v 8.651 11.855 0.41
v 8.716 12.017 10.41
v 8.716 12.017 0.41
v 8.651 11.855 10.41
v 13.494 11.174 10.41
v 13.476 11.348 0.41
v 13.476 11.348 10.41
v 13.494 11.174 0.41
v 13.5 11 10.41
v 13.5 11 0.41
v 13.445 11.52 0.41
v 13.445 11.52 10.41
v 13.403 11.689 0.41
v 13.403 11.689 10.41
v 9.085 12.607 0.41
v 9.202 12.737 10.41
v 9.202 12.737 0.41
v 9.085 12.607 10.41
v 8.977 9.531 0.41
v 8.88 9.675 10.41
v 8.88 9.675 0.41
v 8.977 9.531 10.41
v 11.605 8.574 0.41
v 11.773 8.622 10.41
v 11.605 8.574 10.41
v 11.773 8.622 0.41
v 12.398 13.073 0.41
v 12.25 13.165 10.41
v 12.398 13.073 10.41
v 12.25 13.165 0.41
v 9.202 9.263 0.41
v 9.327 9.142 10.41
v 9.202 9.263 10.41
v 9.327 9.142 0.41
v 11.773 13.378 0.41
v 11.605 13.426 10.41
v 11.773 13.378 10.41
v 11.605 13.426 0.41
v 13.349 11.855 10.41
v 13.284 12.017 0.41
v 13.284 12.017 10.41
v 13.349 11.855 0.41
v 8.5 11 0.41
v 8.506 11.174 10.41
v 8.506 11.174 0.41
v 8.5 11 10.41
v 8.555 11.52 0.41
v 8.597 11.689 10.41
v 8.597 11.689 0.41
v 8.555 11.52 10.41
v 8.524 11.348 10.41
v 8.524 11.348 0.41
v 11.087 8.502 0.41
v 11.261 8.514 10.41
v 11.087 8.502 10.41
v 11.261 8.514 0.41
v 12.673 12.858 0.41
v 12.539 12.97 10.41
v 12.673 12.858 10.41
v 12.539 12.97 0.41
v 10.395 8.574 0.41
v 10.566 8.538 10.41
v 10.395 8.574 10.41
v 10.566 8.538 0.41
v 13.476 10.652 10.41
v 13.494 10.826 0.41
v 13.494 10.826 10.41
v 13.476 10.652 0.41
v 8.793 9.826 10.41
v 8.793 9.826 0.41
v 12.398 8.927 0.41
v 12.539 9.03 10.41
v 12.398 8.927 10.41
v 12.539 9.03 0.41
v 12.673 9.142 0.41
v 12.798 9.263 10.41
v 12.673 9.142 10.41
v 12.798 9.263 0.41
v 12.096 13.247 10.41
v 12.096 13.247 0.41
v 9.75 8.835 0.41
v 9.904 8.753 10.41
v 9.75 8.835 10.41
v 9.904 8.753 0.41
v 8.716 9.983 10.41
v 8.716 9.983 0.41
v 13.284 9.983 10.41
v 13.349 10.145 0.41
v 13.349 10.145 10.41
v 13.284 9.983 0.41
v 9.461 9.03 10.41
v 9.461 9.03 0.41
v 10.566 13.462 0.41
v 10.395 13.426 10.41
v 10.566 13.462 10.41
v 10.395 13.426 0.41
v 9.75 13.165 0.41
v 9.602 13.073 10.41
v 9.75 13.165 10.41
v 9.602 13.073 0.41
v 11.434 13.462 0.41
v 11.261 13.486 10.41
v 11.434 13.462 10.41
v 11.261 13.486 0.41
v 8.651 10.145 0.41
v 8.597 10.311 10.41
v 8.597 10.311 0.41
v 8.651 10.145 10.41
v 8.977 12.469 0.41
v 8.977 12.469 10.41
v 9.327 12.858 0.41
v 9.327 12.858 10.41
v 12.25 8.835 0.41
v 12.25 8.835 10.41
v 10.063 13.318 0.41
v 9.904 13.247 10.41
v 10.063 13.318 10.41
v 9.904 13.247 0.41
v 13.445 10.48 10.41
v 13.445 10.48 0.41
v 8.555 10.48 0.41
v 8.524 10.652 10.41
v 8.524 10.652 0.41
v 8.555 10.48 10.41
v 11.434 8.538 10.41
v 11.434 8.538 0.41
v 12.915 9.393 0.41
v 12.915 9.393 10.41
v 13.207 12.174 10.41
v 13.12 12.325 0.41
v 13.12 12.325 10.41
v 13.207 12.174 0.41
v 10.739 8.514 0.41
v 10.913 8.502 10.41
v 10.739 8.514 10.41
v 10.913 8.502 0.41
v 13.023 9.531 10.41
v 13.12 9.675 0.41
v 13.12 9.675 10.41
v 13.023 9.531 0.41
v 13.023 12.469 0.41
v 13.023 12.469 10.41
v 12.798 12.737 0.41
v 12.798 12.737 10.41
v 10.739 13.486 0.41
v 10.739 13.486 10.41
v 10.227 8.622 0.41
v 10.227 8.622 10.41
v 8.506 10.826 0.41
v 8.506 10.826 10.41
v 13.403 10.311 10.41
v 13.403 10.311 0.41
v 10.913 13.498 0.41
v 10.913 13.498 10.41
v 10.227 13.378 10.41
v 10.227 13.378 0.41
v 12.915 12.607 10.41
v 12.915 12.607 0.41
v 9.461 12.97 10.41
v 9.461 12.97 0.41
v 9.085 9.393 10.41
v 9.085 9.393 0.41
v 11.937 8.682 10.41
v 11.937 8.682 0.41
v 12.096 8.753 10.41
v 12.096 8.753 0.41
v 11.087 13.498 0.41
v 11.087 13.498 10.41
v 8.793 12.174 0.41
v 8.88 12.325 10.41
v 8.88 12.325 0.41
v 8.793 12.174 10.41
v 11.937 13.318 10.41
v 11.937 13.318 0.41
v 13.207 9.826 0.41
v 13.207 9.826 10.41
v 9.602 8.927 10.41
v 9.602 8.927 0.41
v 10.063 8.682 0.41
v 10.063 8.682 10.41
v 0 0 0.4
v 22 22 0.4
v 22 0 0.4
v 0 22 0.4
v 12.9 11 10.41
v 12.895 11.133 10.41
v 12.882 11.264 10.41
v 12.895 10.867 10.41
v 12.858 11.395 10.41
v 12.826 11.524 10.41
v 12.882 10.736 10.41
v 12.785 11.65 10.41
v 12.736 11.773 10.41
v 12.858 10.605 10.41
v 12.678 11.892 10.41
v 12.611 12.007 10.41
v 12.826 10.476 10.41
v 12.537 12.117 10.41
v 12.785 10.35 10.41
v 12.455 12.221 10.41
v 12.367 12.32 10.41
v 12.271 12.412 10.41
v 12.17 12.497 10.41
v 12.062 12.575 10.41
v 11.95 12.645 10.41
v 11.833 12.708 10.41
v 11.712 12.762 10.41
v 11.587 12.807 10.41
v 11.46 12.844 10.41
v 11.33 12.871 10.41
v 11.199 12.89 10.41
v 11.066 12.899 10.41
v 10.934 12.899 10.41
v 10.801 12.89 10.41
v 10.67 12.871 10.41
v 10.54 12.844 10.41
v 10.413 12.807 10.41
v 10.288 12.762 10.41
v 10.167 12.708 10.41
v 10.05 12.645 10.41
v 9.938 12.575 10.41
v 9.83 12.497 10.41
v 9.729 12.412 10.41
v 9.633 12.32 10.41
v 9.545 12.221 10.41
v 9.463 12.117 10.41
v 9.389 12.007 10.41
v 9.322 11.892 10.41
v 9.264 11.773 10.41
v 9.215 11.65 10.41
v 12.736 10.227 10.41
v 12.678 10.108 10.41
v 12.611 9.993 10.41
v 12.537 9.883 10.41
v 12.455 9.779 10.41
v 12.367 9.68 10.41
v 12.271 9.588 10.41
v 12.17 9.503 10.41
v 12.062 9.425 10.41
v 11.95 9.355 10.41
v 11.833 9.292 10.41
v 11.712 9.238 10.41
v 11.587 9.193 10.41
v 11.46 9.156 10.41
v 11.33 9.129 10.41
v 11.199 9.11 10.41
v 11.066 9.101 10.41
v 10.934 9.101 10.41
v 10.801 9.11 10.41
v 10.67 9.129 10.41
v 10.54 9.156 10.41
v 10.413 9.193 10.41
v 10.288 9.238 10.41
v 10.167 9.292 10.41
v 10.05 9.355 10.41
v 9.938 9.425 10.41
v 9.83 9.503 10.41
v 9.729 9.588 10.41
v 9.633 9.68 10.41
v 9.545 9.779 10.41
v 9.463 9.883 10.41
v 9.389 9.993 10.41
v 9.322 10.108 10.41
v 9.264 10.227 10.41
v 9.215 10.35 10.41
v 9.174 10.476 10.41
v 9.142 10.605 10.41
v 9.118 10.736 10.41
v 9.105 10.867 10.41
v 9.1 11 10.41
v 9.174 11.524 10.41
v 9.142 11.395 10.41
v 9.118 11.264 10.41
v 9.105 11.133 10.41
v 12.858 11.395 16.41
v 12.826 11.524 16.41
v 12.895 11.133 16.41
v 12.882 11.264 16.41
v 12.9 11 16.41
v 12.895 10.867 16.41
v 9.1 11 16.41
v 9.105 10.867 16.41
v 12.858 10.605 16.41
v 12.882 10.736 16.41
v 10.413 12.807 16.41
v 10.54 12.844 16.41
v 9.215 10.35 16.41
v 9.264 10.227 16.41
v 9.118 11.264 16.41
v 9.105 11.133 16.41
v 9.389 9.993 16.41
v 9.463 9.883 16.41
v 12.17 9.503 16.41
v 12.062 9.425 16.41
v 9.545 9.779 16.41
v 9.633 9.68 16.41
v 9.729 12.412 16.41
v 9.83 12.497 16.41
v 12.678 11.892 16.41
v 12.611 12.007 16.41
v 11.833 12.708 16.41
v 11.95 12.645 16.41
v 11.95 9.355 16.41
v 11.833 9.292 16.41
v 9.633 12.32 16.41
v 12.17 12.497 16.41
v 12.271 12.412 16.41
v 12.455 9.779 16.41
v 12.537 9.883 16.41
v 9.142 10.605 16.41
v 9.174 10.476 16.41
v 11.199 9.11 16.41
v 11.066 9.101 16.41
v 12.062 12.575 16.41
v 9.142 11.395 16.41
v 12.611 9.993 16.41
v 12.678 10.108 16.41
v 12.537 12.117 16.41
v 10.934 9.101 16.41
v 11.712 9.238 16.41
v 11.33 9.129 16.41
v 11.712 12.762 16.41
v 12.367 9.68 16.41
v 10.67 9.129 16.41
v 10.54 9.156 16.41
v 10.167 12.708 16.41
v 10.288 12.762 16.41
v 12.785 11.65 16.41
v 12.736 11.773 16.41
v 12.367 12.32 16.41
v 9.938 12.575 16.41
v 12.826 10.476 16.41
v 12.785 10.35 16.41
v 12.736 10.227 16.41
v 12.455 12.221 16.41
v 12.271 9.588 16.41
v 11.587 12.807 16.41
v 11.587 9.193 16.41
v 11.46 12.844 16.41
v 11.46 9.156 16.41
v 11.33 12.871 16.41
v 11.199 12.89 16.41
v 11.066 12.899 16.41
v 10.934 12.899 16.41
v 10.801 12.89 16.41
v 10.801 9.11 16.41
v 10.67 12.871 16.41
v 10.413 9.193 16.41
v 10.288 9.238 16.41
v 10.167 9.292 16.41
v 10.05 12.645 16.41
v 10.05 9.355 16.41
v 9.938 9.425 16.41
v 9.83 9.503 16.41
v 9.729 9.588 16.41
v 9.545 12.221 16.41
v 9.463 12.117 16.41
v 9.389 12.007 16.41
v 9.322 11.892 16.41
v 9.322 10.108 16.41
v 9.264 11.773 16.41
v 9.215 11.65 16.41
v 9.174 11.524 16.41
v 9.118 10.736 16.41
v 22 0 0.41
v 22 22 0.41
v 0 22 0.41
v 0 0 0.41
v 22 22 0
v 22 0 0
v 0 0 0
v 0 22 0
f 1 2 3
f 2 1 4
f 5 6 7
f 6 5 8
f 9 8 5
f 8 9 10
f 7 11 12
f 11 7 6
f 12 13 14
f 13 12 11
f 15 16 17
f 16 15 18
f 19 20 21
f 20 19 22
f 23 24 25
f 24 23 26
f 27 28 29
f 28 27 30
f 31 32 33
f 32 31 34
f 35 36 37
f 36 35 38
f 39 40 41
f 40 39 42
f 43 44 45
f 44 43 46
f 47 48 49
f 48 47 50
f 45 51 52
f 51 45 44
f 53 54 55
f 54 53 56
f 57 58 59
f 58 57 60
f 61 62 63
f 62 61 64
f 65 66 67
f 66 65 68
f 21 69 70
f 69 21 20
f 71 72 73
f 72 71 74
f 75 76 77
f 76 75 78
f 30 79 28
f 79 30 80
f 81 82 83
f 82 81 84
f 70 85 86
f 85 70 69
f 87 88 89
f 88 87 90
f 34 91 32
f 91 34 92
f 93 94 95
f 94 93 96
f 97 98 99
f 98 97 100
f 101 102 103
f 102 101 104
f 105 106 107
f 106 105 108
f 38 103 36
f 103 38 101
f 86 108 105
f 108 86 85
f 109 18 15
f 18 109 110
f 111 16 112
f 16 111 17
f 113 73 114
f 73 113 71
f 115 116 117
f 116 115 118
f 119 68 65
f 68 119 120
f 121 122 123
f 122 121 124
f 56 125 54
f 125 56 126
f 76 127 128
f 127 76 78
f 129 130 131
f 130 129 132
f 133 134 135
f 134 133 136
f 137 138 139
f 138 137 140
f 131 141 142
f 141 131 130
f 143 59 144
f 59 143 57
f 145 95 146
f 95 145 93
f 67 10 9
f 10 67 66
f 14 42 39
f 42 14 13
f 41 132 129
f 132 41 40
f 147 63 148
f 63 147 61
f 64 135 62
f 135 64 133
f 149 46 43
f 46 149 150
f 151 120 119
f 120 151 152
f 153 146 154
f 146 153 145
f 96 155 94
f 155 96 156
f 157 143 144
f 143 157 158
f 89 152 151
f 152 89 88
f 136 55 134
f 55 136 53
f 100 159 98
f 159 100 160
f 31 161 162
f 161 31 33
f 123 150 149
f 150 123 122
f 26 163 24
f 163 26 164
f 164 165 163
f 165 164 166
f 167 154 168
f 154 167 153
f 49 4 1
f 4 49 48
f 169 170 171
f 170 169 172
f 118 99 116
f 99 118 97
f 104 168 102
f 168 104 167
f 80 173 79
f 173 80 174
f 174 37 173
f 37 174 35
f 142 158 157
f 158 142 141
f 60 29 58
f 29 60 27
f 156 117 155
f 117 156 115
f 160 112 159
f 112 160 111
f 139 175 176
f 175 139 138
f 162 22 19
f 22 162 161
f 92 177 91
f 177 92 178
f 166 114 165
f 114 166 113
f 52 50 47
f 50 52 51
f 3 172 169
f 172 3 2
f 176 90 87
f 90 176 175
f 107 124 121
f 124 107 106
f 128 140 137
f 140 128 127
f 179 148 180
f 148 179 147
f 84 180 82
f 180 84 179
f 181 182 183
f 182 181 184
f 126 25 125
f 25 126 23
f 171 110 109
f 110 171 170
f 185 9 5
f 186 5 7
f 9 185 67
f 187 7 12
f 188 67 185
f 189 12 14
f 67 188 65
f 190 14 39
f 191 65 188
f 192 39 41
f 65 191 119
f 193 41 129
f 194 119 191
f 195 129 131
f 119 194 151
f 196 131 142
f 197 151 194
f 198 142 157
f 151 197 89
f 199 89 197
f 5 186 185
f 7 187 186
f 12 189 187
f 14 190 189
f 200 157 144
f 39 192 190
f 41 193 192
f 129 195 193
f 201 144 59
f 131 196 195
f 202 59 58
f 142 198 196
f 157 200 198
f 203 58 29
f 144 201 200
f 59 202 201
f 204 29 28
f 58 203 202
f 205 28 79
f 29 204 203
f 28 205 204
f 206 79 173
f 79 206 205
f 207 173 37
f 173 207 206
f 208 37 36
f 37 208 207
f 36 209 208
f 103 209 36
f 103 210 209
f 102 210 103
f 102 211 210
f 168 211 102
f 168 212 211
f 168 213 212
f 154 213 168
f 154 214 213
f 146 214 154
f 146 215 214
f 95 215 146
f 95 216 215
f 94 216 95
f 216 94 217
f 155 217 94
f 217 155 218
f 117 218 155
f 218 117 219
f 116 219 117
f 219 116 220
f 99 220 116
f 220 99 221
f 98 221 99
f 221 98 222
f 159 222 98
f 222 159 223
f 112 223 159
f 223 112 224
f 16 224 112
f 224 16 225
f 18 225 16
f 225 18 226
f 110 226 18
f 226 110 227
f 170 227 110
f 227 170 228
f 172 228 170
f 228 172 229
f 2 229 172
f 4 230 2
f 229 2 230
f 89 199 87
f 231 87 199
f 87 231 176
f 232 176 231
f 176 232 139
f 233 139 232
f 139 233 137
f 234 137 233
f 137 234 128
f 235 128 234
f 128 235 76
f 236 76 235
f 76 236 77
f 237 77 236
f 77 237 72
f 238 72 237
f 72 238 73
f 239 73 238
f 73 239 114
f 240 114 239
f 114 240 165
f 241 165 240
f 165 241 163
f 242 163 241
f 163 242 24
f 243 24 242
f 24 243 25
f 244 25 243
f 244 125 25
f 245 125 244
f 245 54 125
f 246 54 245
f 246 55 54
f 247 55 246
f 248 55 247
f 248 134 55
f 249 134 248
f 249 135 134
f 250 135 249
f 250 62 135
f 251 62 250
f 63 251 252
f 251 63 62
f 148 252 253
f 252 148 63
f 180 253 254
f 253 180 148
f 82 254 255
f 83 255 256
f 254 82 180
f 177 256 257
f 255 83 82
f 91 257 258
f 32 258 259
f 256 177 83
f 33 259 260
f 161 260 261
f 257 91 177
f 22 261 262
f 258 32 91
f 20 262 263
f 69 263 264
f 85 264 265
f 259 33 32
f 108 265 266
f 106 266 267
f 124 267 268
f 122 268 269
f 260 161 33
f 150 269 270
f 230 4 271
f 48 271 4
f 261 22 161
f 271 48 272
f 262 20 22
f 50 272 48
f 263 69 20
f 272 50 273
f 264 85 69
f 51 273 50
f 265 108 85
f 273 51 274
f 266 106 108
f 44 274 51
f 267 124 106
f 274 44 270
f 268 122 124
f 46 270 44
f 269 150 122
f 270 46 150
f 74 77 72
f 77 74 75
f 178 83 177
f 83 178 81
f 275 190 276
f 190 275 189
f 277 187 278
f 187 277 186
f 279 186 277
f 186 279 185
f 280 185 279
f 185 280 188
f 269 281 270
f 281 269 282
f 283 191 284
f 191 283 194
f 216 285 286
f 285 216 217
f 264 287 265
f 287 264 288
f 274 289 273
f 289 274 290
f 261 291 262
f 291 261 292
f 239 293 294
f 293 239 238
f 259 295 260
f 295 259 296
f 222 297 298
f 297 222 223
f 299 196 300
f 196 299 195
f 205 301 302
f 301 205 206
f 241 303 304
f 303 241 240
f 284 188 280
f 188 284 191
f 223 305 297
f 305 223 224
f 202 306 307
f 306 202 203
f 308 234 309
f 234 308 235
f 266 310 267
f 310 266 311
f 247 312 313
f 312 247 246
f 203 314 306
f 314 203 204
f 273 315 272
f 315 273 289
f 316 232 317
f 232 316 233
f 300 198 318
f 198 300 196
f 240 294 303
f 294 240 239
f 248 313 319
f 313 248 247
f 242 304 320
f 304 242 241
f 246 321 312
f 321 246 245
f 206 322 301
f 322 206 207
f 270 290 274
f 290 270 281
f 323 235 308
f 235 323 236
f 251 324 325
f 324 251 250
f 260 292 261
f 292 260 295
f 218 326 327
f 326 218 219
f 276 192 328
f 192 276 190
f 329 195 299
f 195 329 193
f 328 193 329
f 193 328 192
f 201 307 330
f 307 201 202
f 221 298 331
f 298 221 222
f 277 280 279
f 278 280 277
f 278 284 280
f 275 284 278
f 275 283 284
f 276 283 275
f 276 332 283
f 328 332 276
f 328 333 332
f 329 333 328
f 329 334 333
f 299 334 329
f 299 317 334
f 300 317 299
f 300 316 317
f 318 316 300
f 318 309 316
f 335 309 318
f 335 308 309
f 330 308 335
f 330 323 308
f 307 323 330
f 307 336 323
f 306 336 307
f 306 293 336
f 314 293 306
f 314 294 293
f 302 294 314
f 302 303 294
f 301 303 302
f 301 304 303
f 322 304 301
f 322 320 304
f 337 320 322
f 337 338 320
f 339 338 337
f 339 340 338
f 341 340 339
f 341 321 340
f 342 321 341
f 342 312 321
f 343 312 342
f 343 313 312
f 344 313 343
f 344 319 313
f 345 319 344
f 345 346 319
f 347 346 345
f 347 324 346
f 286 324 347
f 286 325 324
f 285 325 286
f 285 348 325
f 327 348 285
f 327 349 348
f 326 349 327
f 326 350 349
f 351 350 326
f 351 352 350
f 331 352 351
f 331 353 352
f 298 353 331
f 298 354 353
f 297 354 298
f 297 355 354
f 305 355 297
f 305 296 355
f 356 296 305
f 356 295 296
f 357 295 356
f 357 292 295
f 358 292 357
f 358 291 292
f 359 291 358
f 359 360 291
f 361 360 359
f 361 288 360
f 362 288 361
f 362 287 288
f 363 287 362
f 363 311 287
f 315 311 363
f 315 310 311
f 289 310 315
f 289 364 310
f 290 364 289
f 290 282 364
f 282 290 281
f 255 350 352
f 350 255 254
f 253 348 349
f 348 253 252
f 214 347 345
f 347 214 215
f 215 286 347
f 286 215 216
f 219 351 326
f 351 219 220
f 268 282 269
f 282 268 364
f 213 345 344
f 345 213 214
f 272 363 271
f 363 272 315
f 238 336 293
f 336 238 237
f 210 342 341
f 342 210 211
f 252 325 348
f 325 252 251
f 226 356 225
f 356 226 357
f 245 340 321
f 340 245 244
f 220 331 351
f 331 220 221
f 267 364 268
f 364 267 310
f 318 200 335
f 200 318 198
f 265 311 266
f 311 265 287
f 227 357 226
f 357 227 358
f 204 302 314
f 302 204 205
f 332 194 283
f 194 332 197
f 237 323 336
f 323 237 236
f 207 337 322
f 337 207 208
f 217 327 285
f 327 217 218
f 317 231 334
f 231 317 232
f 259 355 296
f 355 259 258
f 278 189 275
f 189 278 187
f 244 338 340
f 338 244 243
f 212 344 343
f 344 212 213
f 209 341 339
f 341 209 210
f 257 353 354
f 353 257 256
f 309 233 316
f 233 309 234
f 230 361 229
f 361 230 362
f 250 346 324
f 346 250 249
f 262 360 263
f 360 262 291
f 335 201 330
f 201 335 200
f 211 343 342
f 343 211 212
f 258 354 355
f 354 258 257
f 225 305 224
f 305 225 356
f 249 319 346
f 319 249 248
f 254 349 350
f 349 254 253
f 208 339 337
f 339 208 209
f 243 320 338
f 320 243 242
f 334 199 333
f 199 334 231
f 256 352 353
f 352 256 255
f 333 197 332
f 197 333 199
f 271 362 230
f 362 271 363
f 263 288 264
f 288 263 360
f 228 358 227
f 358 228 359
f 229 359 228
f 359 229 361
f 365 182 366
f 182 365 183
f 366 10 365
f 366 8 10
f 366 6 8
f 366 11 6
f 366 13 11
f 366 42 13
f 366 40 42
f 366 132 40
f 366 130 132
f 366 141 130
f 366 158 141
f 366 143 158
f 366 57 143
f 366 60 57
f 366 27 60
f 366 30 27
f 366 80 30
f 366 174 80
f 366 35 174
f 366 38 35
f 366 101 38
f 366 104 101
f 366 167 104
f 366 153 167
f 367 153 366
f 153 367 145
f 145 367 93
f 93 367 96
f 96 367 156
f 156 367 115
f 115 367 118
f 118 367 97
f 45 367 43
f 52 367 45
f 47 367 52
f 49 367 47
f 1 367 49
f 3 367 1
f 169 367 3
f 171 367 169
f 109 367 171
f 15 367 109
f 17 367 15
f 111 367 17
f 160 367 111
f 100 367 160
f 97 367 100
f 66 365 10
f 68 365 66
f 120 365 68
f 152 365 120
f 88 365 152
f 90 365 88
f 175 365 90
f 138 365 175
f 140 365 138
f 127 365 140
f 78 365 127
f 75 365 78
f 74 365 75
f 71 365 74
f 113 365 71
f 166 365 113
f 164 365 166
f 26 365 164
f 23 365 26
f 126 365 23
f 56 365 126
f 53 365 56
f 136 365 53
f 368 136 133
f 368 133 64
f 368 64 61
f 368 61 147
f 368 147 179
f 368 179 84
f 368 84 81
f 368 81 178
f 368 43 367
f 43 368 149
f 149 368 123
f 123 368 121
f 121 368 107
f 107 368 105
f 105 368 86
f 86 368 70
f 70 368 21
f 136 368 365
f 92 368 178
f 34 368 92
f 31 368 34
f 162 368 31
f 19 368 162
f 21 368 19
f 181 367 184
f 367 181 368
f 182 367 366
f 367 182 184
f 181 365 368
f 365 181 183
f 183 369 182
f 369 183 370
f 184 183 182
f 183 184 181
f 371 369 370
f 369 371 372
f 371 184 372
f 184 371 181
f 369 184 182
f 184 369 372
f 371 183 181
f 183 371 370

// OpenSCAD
// file: ../../Base/Rotation.scad
// Fischertechnik Box Foundation
// Geometry Helpers Rotation

include <PlacementOptions.scad>

// getRotatedSpace(space, rotation=NoRotation)
// Rotates the space dependent on the specified rotation

function getRotatedSpace(space, rotation=NoRotation) = [
    (rotation == Rotate90 || rotation == Rotate270) ? space.y : space.x,
    (rotation == Rotate90 || rotation == Rotate270) ? space.x : space.y
];

// Rotates the given space around the fixed left lower corner
// space = the space the children needs as width/depth list [width,depth]
// rotation = 0 Rotate0 degrees, 1 Rotate90 degrees, 2 Rotate180 degrees, 3 Rotate270 degrees (equivalent to -90)

module RotateFix(space, rotation=NoRotation) {
    dy = (rotation == Rotate0 || rotation == Rotate270) ? 0 :
        (rotation == Rotate90) ? space.x :
        space.y;
    dx = (rotation < Rotate180) ? 0 :
        (rotation == Rotate180) ? space.x :
        space.y;
    
    translate([dx, dy, 0])
        rotate([0, 0, rotations[rotation]])
            children();
}
// file: ../../Base/Alignment.scad
// Fischertechnik Box Foundation
// Geometry Helpers Alignment

include <PlacementOptions.scad>

// getAlignedX(elementWidth, spaceWidth, align=AlignRight, offset=0)
// Gets the aligned X offset of an element with the given
// width in the given space.
// elementWidth = The width of the element to positon
// spaceWidth = The space where the element should be aligned
// align = 0 AlignLeft, 1 AlignCenter, 2 AlignRight
// offset = an optional offset from the aligned position. When
// aligned left or centered, then positive values are in X direction.
// When aligned right then positive values are in negative X direction.

function getAlignedX(elementWidth, spaceWidth, align=AlignRight, offset=0) =
    (align == AlignLeft) ?
        offset :
        ((align == AlignCenter) ?
        (spaceWidth - elementWidth)/2 + offset :
        spaceWidth - offset - elementWidth);

// getAlignedY(elementDepth, spaceDepth, align=AlignTop, offset=0)
// Gets the aligned Y offset of an element with the given
// depth in the given space.
// elementDepth = The depth of the element to positon
// spaceDepth = The space where the element should be aligned
// align = 0 AlignBottom, 1 AlignCenter, 2 AlignTop
// offset = an optional offset from the aligned position. When
// aligned bottom or centered, then positive values are in Y direction.
// When aligned top then positive values are in negative Y direction.

function getAlignedY(elementDepth, spaceDepth, align=AlignTop, offset=0) =
    (align == AlignBottom) ?
        offset :
        ((align == AlignCenter) ?
        (spaceDepth - elementDepth)/2 + offset :
        spaceDepth - offset - elementDepth);
// file: ../../Base/PlacementOptions.scad
// Fischertechnik Box Foundation
// Placement Options

// Alignment
NoAlign = 0;
AlignLeft = 1;
AlignBottom = 2;
AlignCenter = 3;
AlignRight = 4;
AlignTop = 5;

// Element rotation degree steps
rotations = [0, -90, -180, -270];

// Rotation
NoRotation = 0;
Rotate0 = 0;
Rotate90 = 1;
Rotate180 = 2;
Rotate270 = 3;

// Docking (seen from above)
NoDock = -1;
DockLeft = 0;
DockTop = 1;
DockRight = 2;
DockCorner = 2;
DockBottom = 3;

// Web corners
LowerLeft = 0;
UpperLeft = 1;
UpperRight = 2;
LowerRight = 3;

// Web position relative to corner
LeftOfCorner = 0;
RightOfCorner = 1;
// file: ../../Base/Boxes.scad
// Fischertechnik Box Foundation
// Pre-designed Boxes

use <Constants.scad>

include <PlacementOptions.scad>

box190Width = 190;
box190Depth = 130;
box130Width = 130;
box130Depth = 95;

// Values are from an original ec3 box
topBottomDifference = 1.5;
outerHeight = 40;
innerHeight = 38.2;
baseThickness = outerHeight - innerHeight;
stackExcess = 5.7;
radius = 3.5;
wallThickness = 1.5;
tolerance = 0.2;
stackOffset = innerHeight - stackExcess;

boxUsageHeight = stackOffset;
boxWallThickness = wallThickness;
boxBaseThickness = baseThickness;
boxWebWidth = 3.0;

// getBoxWallThickness()
// Gets the wall thickness of a Fischertechnik Box
function getBoxWallThickness() = boxWallThickness;

// getBoxUsageHeight()
// Gets the usable height of a Fischertechnik box
function getBoxUsageHeight() = boxUsageHeight;

// getBoxInnerHeight()
// Gets the inner height of a Fischertechnik box, including the stack excess
function getBoxInnerHeight() = innerHeight;

// getBoxBaseThickness()
// Gets the thickness of the Fischertechnik box base.
function getBoxBaseThickness() = boxBaseThickness;

// getBoxWebWidth()
// Gets the width of a box web
function getBoxWebWidth() = boxWebWidth;

// getBox190Space()
// Gets the usable inner space of a Box 190 as an x/y-list
function getBox190Space() = [
    box190Width - 2*getBoxWallThickness() - topBottomDifference, 
    box190Depth - 2*getBoxWallThickness() - topBottomDifference ];

// BoxBase(width, depth)
// Creates an empty stackable Fischertechnik compatible box
// width = Outer width of the box (190, 130, ...)
// depth = Outer depth of the box (130, 95, ...)

module BoxBase(width, depth, height=outerHeight) {    
    thinPlate = 0.01;

    innerHeight = height - baseThickness;    
    
    module BodyPlate(width, depth) {
        translate([radius, radius])
        hull() {
            w = width-2*radius;
            d = depth-2*radius;
            cube([w, d, thinPlate]);
            cylinder(thinPlate, r=radius, $fn=getFragments());
            translate([w, 0])
                cylinder(thinPlate, r=radius, $fn=getFragments());
            translate([w, d])
                cylinder(thinPlate, r=radius, $fn=getFragments());
            translate([0, d])
                cylinder(thinPlate, r=radius, $fn=getFragments());
        }
    }
    
    module Body(tolerance=tolerance) {
        hull() {
            // Bottom with tolerance to fit into the original boxes when stacked
            translate([-wallThickness+tolerance, -wallThickness+tolerance, -baseThickness])
                BodyPlate(width-topBottomDifference-2*tolerance, depth-topBottomDifference-2*tolerance);
            
            // Top
            translate([-wallThickness-topBottomDifference/2, -wallThickness-topBottomDifference/2, innerHeight-thinPlate])
                BodyPlate(width, depth);
         }
    }

    module Cutoff() {
        hull() {
            coWidth = width - 2*wallThickness;
            coDepth = depth - 2*wallThickness;
            
            // Bottom
            BodyPlate(coWidth-topBottomDifference, coDepth-topBottomDifference);

            // Top
            translate([-topBottomDifference/2, -topBottomDifference/2, innerHeight+thinPlate]) 
                BodyPlate(coWidth, coDepth);
        }
    }
    
    difference() {        
        Body();
        Cutoff();
        stackOffset = innerHeight - stackExcess;
        translate([0, 0, stackOffset + baseThickness])
            Body(tolerance=0);
    }
}

// Creates the Fischertechnik empty box 130x190 mm and places it at position 0,0
// 190x130 are the outer sizes, the inner space is slightly smaller. Use getBox190Space() to get the inner sizes.
// The box is positioned that the usable inner space is at the 0,0,0 position. The

module Box190() {
    BoxBase(box190Width, box190Depth);
}

// Gets the usable inner space of a Box 130 as an x/y-list
function getBox130Space() = [
    box130Width - 2*getBoxWallThickness() - topBottomDifference, 
    box130Depth - 2*getBoxWallThickness() - topBottomDifference ];

// Creates the Fischertechnik empty box 95x130 mm and places it at position 0,0
// 190x130 are the outer sizes, the inner space is slightly smaller. Use getBox190Space() to get the inner sizes.
// The box is positioned that the usable inner space is at the 0,0,0 position. The

module Box130() {
    BoxBase(box130Width, box130Depth);
}

// Creates a web at the specified box walls
// corner 0 = LowerLeft, 1 = UpperLeft, 2 = UpperRight, 3 = LowerRight
// side 0 = LeftOfCorner, 1 = RightOfCorner
// distance = Distance in mm from the corner
// boxSpace = inner width and depth of the box (default: Box 190)
// webWidth = length of the web (default is 3 mms)
// webThickness = thickness of the web (default is 1 mm)

module BoxWeb(corner, side, distance, boxSpace=getBox190Space(), webWidth=getBoxWebWidth(), webThickness=1.0) {
    sink = getBoxWallThickness()/2;

    width = (corner % 2 == 0) ? 
            (side == LeftOfCorner ? webWidth : webThickness) :
            (side == LeftOfCorner ? webThickness : webWidth);

    depth = (corner % 2 == 0) ? 
            (side == RightOfCorner ? webWidth : webThickness) :
            (side == RightOfCorner ? webThickness : webWidth);
    
    xDiff = corner == LowerLeft ? 
                (side == LeftOfCorner ? -sink : distance) :
            (corner == UpperLeft ?                
                (side == LeftOfCorner ? distance : -sink) :
            (corner == UpperRight ?
                (side == LeftOfCorner ? boxSpace.x-webWidth+sink : boxSpace.x-distance-webThickness) :
                (side == LeftOfCorner ? boxSpace.x-distance-webThickness: boxSpace.x-webWidth+sink)));

    yDiff = corner == LowerLeft ? 
                (side == RightOfCorner ? -sink : distance) :
            (corner == UpperLeft ?
                (side == RightOfCorner ? boxSpace.y-distance : boxSpace.y-webWidth+sink) :
            (corner == UpperRight ?
                (side == RightOfCorner ? boxSpace.y-webWidth+sink : boxSpace.y-distance) :
                (side == RightOfCorner ? distance : -sink)));
    
    translate([xDiff, yDiff, -getExcess()])
        cube([width, depth, boxUsageHeight + 2*getExcess()]);
}
// file: ../../Base/Placement.scad
// Fischertechnik Box Foundation
// Geometry Helpers Placement

use <Constants.scad>
use <Alignment.scad>
use <Rotation.scad>
use <Boxes.scad>

include <PlacementOptions.scad>

// Place(x=0, y=0, elementSpace=[0,0], alignX=AlignLeft, alignY=AlignBottom, rotation=Rotate0, boxSpace=getBox190Space())
// Places the child at the specified position
// y = Y-Position. This is a relative position when an X aligment is specified.
// x = X-Position. This is a relative position when an Y aligment is specified.
// elementSpace = space of the element to be placed [x,y]
// alignX = -1=NoAlign, 0 AlignLeft, 1 AlignCenter, 3 AlignRight (elementSpace and boxSpace required!)
// alignY = -1=NoAlign, 2 AlignBottom, 1 AlignCenter, 4 AlignTop (elementSpace and boxSpace required!)
// rotation = 0 Rotate0 0 degrees, 1 Rotate90 90 degrees, 
// 2 Rotate180 180 degrees, 3 Rotate270 270 degrees (equivalent to -90)
// boxSpace = Inner space of the box where the placement occurs [x,y] - default is Box 190x130 inner space

module Place(x=0, y=0, elementSpace=[0,0], 
  alignX=AlignLeft, alignY=AlignBottom, 
  rotation=NoRotation, boxSpace=getBox190Space()) {

    module Position(x, y, space, rotation=Rotate0) {
        translate([x, y, 0])
            RotateFix(space, rotation)
                children();
    }

    space = getRotatedSpace(elementSpace, rotation);
    alignedX = getAlignedX(space.x, boxSpace.x, alignX, x);
    alignedY = getAlignedY(space.y, boxSpace.y, alignY, y);
    Position(alignedX, alignedY, elementSpace, rotation)
        children();
}

// Center(space=getBox130Space(), elementSpace=[0,0])
// space = Space where the children is centered. For cylinder use centered=true and no elementSpace.
// elementSpace = space of the element to be centered [x,y]

module Center(space=getBox190Space(), elementSpace=[0,0]) {
    Place(elementSpace=elementSpace, boxSpace=space, alignX=AlignCenter, alignY=AlignCenter)
        children();
}

// CenterHorizontal(width=0, y=0, offset=0, space=getBox130Space())
// width = Width of the element to be placed.
// y = Y position of the element
// offset = Offset from the center position (negative will be left of the center)
// space = Space where the element is placed

module CenterHorizontal(width=0, y=0, offset=0, space=getBox190Space()) {
    Place(x=offset, y=y, elementSpace=[width, 0], boxSpace=space, alignX=AlignCenter)
        children(0);
}

// CenterVertical(depth=0, x=0, offset=0, space=getBox130Space())
// depth = Depth of the element to be placed.
// x = X position of the element
// offset = Offset from the center position (negative will be down of the center)
// space = Space where the element is placed

module CenterVertical(depth=0, x=0, offset=0, space=getBox190Space()) {
    Place(x=x, y=offset, elementSpace=[0, depth], boxSpace=space, alignY=AlignCenter)
        children(0);
}

// getIsVertical(align)
// True if the specified alignment needs a vertical orientation for a divider (AlignRight, AlignLeft)

function getIsVertical(align) = (align == AlignRight || align == AlignLeft);

// getIsHorizontal(align)
// True if the specified alignment needs a horizontal orientation for a divider (AlignTop, AlignBottom)

function getIsHorizontal(align) = (align == AlignTop || align == AlignBottom);
// file: ../../Elements/AxisClip10.scad
// Fischertechnik Box Library
// Axis for clip 10
// 31023

use <../ModelBase/Simple.scad>
use <../Base/Constants.scad>

/* [Element Parameters] */
height = 23;
clipHeight = 10;

/* [Hidden] */
width = 12;
depth = 12;
upperDiameter = 3.6;

// getAxisClip10Space()
// Gets the space of a frame for a clip 10 with spring ring (mot2)

function getAxisClip10Space() = [width, depth, height];

// AxisClip10(height, clipHeight)
// Axis for clip 10 with spring ring (mot2)
// height = Height of the complete axis (standard is 23, in mot3 its only 12)
// clipHeight = Height of the part for the clip (standard is 10, in mot3 its only 7)

module AxisClip10(height=height, clipHeight=clipHeight) {
    LeveledAxisWithSpace(height, height-clipHeight, getAxisClip10Space(), diameter=upperDiameter);
}

// Test
color("lightgray")
AxisClip10(height, clipHeight);
// file: ../../Base/Constants.scad
// Fischertechnik Box Foundation
// Constants

// Constant values necessary for multiple elements

// Base constants
dividerThickness = 1.2;
excess = 0.01;
fragments = 90;
tolerance = 0.8;

// Gets the thickness of a divider 
function getDividerThickness() = dividerThickness;

// Gets the excess that is used to merge walls into each other
function getExcess() = excess;

// Gets amount of fragments of a cylinder
function getFragments() = fragments;

// Gets the inner tolerance of a frame to each side
function getTolerance() = tolerance;


// Fischertechnik specific constants
axisDiameter = 4;
axisBottomDiameter = axisDiameter + 1;
axisTolerance = 0.2;
standardEdgeDistance = 2.5;
standardWebDistance = 11.5;
standardCornerLength = 15;
tubeWallFactor = 0.8;
smallPartsFrameHeight = 20;

// Gets axis diameter of Fischertechnik axis
function getAxisDiameter() = axisDiameter;

// Gets axis diameter tolerance (subtracted for element axis)
function getAxisTolerance() = axisTolerance;

// Gets the axis diameter for standing axis
function getStandAxisDiameter() = getAxisDiameter() - getAxisTolerance();

// Gets axis bottom diameter for thicker part at the bottom
function getAxisBottomDiameter() = axisBottomDiameter;

// gets the standard distance to the wall of the box for dockable frames with webs
function getStandardEdgeDistance() = standardEdgeDistance;

// gets the standard distance of each web to the corner of the dockable frame
function getStandardWebDistance() = standardWebDistance;

// gets the standard length of the corner walls of a dockable frame
function getStandardCornerLength() = standardCornerLength;

// gets the wall thickness of a tube.
function getTubeWallThickness() = tubeWallFactor * getDividerThickness();

// gets the frame height for docked small parts boxes.
function getSmallPartsFrameHeight() = smallPartsFrameHeight;
// file: ../../Elements/AxisPulley.scad
// Fischertechnik Box Library
// Axis for Wheel Pulley
// 35795

use <../Base/Constants.scad>
use <../ModelBase/Simple.scad>

width = 22;
depth = 22;

// getAxisPulleySpace()
// Gets the space the axis wheel pulley needs as width and depth (.x and .y as a list)

function getAxisPulleySpace() = [width, depth];

// AxisPulley()
// Standing axis for wheel pulley.

module AxisPulley() {
    height = 16;
    levelHeight = 10;
    LeveledAxisWithSpace(height, levelHeight, getAxisPulleySpace());
}

// Tests
color("lightgray")
AxisPulley();
// file: ../TestPrint.scad
// 3D Print Test Base

use <../Base/Constants.scad>

use <../Elements/AxisClip10.scad>

module TestPrint(elementSpace) {
    cube([elementSpace.x, elementSpace.y, 0.4]);
    translate([0,0,0.4+getExcess()]) {
        children();
    }
}

TestPrint(getAxisClip10Space())
    AxisClip10();
// main file
// 3D Print Test
// AxisPulley

use <../TestPrint.scad>
use <../../Elements/AxisPulley.scad>

TestPrint(getAxisPulleySpace())
    AxisPulley();
